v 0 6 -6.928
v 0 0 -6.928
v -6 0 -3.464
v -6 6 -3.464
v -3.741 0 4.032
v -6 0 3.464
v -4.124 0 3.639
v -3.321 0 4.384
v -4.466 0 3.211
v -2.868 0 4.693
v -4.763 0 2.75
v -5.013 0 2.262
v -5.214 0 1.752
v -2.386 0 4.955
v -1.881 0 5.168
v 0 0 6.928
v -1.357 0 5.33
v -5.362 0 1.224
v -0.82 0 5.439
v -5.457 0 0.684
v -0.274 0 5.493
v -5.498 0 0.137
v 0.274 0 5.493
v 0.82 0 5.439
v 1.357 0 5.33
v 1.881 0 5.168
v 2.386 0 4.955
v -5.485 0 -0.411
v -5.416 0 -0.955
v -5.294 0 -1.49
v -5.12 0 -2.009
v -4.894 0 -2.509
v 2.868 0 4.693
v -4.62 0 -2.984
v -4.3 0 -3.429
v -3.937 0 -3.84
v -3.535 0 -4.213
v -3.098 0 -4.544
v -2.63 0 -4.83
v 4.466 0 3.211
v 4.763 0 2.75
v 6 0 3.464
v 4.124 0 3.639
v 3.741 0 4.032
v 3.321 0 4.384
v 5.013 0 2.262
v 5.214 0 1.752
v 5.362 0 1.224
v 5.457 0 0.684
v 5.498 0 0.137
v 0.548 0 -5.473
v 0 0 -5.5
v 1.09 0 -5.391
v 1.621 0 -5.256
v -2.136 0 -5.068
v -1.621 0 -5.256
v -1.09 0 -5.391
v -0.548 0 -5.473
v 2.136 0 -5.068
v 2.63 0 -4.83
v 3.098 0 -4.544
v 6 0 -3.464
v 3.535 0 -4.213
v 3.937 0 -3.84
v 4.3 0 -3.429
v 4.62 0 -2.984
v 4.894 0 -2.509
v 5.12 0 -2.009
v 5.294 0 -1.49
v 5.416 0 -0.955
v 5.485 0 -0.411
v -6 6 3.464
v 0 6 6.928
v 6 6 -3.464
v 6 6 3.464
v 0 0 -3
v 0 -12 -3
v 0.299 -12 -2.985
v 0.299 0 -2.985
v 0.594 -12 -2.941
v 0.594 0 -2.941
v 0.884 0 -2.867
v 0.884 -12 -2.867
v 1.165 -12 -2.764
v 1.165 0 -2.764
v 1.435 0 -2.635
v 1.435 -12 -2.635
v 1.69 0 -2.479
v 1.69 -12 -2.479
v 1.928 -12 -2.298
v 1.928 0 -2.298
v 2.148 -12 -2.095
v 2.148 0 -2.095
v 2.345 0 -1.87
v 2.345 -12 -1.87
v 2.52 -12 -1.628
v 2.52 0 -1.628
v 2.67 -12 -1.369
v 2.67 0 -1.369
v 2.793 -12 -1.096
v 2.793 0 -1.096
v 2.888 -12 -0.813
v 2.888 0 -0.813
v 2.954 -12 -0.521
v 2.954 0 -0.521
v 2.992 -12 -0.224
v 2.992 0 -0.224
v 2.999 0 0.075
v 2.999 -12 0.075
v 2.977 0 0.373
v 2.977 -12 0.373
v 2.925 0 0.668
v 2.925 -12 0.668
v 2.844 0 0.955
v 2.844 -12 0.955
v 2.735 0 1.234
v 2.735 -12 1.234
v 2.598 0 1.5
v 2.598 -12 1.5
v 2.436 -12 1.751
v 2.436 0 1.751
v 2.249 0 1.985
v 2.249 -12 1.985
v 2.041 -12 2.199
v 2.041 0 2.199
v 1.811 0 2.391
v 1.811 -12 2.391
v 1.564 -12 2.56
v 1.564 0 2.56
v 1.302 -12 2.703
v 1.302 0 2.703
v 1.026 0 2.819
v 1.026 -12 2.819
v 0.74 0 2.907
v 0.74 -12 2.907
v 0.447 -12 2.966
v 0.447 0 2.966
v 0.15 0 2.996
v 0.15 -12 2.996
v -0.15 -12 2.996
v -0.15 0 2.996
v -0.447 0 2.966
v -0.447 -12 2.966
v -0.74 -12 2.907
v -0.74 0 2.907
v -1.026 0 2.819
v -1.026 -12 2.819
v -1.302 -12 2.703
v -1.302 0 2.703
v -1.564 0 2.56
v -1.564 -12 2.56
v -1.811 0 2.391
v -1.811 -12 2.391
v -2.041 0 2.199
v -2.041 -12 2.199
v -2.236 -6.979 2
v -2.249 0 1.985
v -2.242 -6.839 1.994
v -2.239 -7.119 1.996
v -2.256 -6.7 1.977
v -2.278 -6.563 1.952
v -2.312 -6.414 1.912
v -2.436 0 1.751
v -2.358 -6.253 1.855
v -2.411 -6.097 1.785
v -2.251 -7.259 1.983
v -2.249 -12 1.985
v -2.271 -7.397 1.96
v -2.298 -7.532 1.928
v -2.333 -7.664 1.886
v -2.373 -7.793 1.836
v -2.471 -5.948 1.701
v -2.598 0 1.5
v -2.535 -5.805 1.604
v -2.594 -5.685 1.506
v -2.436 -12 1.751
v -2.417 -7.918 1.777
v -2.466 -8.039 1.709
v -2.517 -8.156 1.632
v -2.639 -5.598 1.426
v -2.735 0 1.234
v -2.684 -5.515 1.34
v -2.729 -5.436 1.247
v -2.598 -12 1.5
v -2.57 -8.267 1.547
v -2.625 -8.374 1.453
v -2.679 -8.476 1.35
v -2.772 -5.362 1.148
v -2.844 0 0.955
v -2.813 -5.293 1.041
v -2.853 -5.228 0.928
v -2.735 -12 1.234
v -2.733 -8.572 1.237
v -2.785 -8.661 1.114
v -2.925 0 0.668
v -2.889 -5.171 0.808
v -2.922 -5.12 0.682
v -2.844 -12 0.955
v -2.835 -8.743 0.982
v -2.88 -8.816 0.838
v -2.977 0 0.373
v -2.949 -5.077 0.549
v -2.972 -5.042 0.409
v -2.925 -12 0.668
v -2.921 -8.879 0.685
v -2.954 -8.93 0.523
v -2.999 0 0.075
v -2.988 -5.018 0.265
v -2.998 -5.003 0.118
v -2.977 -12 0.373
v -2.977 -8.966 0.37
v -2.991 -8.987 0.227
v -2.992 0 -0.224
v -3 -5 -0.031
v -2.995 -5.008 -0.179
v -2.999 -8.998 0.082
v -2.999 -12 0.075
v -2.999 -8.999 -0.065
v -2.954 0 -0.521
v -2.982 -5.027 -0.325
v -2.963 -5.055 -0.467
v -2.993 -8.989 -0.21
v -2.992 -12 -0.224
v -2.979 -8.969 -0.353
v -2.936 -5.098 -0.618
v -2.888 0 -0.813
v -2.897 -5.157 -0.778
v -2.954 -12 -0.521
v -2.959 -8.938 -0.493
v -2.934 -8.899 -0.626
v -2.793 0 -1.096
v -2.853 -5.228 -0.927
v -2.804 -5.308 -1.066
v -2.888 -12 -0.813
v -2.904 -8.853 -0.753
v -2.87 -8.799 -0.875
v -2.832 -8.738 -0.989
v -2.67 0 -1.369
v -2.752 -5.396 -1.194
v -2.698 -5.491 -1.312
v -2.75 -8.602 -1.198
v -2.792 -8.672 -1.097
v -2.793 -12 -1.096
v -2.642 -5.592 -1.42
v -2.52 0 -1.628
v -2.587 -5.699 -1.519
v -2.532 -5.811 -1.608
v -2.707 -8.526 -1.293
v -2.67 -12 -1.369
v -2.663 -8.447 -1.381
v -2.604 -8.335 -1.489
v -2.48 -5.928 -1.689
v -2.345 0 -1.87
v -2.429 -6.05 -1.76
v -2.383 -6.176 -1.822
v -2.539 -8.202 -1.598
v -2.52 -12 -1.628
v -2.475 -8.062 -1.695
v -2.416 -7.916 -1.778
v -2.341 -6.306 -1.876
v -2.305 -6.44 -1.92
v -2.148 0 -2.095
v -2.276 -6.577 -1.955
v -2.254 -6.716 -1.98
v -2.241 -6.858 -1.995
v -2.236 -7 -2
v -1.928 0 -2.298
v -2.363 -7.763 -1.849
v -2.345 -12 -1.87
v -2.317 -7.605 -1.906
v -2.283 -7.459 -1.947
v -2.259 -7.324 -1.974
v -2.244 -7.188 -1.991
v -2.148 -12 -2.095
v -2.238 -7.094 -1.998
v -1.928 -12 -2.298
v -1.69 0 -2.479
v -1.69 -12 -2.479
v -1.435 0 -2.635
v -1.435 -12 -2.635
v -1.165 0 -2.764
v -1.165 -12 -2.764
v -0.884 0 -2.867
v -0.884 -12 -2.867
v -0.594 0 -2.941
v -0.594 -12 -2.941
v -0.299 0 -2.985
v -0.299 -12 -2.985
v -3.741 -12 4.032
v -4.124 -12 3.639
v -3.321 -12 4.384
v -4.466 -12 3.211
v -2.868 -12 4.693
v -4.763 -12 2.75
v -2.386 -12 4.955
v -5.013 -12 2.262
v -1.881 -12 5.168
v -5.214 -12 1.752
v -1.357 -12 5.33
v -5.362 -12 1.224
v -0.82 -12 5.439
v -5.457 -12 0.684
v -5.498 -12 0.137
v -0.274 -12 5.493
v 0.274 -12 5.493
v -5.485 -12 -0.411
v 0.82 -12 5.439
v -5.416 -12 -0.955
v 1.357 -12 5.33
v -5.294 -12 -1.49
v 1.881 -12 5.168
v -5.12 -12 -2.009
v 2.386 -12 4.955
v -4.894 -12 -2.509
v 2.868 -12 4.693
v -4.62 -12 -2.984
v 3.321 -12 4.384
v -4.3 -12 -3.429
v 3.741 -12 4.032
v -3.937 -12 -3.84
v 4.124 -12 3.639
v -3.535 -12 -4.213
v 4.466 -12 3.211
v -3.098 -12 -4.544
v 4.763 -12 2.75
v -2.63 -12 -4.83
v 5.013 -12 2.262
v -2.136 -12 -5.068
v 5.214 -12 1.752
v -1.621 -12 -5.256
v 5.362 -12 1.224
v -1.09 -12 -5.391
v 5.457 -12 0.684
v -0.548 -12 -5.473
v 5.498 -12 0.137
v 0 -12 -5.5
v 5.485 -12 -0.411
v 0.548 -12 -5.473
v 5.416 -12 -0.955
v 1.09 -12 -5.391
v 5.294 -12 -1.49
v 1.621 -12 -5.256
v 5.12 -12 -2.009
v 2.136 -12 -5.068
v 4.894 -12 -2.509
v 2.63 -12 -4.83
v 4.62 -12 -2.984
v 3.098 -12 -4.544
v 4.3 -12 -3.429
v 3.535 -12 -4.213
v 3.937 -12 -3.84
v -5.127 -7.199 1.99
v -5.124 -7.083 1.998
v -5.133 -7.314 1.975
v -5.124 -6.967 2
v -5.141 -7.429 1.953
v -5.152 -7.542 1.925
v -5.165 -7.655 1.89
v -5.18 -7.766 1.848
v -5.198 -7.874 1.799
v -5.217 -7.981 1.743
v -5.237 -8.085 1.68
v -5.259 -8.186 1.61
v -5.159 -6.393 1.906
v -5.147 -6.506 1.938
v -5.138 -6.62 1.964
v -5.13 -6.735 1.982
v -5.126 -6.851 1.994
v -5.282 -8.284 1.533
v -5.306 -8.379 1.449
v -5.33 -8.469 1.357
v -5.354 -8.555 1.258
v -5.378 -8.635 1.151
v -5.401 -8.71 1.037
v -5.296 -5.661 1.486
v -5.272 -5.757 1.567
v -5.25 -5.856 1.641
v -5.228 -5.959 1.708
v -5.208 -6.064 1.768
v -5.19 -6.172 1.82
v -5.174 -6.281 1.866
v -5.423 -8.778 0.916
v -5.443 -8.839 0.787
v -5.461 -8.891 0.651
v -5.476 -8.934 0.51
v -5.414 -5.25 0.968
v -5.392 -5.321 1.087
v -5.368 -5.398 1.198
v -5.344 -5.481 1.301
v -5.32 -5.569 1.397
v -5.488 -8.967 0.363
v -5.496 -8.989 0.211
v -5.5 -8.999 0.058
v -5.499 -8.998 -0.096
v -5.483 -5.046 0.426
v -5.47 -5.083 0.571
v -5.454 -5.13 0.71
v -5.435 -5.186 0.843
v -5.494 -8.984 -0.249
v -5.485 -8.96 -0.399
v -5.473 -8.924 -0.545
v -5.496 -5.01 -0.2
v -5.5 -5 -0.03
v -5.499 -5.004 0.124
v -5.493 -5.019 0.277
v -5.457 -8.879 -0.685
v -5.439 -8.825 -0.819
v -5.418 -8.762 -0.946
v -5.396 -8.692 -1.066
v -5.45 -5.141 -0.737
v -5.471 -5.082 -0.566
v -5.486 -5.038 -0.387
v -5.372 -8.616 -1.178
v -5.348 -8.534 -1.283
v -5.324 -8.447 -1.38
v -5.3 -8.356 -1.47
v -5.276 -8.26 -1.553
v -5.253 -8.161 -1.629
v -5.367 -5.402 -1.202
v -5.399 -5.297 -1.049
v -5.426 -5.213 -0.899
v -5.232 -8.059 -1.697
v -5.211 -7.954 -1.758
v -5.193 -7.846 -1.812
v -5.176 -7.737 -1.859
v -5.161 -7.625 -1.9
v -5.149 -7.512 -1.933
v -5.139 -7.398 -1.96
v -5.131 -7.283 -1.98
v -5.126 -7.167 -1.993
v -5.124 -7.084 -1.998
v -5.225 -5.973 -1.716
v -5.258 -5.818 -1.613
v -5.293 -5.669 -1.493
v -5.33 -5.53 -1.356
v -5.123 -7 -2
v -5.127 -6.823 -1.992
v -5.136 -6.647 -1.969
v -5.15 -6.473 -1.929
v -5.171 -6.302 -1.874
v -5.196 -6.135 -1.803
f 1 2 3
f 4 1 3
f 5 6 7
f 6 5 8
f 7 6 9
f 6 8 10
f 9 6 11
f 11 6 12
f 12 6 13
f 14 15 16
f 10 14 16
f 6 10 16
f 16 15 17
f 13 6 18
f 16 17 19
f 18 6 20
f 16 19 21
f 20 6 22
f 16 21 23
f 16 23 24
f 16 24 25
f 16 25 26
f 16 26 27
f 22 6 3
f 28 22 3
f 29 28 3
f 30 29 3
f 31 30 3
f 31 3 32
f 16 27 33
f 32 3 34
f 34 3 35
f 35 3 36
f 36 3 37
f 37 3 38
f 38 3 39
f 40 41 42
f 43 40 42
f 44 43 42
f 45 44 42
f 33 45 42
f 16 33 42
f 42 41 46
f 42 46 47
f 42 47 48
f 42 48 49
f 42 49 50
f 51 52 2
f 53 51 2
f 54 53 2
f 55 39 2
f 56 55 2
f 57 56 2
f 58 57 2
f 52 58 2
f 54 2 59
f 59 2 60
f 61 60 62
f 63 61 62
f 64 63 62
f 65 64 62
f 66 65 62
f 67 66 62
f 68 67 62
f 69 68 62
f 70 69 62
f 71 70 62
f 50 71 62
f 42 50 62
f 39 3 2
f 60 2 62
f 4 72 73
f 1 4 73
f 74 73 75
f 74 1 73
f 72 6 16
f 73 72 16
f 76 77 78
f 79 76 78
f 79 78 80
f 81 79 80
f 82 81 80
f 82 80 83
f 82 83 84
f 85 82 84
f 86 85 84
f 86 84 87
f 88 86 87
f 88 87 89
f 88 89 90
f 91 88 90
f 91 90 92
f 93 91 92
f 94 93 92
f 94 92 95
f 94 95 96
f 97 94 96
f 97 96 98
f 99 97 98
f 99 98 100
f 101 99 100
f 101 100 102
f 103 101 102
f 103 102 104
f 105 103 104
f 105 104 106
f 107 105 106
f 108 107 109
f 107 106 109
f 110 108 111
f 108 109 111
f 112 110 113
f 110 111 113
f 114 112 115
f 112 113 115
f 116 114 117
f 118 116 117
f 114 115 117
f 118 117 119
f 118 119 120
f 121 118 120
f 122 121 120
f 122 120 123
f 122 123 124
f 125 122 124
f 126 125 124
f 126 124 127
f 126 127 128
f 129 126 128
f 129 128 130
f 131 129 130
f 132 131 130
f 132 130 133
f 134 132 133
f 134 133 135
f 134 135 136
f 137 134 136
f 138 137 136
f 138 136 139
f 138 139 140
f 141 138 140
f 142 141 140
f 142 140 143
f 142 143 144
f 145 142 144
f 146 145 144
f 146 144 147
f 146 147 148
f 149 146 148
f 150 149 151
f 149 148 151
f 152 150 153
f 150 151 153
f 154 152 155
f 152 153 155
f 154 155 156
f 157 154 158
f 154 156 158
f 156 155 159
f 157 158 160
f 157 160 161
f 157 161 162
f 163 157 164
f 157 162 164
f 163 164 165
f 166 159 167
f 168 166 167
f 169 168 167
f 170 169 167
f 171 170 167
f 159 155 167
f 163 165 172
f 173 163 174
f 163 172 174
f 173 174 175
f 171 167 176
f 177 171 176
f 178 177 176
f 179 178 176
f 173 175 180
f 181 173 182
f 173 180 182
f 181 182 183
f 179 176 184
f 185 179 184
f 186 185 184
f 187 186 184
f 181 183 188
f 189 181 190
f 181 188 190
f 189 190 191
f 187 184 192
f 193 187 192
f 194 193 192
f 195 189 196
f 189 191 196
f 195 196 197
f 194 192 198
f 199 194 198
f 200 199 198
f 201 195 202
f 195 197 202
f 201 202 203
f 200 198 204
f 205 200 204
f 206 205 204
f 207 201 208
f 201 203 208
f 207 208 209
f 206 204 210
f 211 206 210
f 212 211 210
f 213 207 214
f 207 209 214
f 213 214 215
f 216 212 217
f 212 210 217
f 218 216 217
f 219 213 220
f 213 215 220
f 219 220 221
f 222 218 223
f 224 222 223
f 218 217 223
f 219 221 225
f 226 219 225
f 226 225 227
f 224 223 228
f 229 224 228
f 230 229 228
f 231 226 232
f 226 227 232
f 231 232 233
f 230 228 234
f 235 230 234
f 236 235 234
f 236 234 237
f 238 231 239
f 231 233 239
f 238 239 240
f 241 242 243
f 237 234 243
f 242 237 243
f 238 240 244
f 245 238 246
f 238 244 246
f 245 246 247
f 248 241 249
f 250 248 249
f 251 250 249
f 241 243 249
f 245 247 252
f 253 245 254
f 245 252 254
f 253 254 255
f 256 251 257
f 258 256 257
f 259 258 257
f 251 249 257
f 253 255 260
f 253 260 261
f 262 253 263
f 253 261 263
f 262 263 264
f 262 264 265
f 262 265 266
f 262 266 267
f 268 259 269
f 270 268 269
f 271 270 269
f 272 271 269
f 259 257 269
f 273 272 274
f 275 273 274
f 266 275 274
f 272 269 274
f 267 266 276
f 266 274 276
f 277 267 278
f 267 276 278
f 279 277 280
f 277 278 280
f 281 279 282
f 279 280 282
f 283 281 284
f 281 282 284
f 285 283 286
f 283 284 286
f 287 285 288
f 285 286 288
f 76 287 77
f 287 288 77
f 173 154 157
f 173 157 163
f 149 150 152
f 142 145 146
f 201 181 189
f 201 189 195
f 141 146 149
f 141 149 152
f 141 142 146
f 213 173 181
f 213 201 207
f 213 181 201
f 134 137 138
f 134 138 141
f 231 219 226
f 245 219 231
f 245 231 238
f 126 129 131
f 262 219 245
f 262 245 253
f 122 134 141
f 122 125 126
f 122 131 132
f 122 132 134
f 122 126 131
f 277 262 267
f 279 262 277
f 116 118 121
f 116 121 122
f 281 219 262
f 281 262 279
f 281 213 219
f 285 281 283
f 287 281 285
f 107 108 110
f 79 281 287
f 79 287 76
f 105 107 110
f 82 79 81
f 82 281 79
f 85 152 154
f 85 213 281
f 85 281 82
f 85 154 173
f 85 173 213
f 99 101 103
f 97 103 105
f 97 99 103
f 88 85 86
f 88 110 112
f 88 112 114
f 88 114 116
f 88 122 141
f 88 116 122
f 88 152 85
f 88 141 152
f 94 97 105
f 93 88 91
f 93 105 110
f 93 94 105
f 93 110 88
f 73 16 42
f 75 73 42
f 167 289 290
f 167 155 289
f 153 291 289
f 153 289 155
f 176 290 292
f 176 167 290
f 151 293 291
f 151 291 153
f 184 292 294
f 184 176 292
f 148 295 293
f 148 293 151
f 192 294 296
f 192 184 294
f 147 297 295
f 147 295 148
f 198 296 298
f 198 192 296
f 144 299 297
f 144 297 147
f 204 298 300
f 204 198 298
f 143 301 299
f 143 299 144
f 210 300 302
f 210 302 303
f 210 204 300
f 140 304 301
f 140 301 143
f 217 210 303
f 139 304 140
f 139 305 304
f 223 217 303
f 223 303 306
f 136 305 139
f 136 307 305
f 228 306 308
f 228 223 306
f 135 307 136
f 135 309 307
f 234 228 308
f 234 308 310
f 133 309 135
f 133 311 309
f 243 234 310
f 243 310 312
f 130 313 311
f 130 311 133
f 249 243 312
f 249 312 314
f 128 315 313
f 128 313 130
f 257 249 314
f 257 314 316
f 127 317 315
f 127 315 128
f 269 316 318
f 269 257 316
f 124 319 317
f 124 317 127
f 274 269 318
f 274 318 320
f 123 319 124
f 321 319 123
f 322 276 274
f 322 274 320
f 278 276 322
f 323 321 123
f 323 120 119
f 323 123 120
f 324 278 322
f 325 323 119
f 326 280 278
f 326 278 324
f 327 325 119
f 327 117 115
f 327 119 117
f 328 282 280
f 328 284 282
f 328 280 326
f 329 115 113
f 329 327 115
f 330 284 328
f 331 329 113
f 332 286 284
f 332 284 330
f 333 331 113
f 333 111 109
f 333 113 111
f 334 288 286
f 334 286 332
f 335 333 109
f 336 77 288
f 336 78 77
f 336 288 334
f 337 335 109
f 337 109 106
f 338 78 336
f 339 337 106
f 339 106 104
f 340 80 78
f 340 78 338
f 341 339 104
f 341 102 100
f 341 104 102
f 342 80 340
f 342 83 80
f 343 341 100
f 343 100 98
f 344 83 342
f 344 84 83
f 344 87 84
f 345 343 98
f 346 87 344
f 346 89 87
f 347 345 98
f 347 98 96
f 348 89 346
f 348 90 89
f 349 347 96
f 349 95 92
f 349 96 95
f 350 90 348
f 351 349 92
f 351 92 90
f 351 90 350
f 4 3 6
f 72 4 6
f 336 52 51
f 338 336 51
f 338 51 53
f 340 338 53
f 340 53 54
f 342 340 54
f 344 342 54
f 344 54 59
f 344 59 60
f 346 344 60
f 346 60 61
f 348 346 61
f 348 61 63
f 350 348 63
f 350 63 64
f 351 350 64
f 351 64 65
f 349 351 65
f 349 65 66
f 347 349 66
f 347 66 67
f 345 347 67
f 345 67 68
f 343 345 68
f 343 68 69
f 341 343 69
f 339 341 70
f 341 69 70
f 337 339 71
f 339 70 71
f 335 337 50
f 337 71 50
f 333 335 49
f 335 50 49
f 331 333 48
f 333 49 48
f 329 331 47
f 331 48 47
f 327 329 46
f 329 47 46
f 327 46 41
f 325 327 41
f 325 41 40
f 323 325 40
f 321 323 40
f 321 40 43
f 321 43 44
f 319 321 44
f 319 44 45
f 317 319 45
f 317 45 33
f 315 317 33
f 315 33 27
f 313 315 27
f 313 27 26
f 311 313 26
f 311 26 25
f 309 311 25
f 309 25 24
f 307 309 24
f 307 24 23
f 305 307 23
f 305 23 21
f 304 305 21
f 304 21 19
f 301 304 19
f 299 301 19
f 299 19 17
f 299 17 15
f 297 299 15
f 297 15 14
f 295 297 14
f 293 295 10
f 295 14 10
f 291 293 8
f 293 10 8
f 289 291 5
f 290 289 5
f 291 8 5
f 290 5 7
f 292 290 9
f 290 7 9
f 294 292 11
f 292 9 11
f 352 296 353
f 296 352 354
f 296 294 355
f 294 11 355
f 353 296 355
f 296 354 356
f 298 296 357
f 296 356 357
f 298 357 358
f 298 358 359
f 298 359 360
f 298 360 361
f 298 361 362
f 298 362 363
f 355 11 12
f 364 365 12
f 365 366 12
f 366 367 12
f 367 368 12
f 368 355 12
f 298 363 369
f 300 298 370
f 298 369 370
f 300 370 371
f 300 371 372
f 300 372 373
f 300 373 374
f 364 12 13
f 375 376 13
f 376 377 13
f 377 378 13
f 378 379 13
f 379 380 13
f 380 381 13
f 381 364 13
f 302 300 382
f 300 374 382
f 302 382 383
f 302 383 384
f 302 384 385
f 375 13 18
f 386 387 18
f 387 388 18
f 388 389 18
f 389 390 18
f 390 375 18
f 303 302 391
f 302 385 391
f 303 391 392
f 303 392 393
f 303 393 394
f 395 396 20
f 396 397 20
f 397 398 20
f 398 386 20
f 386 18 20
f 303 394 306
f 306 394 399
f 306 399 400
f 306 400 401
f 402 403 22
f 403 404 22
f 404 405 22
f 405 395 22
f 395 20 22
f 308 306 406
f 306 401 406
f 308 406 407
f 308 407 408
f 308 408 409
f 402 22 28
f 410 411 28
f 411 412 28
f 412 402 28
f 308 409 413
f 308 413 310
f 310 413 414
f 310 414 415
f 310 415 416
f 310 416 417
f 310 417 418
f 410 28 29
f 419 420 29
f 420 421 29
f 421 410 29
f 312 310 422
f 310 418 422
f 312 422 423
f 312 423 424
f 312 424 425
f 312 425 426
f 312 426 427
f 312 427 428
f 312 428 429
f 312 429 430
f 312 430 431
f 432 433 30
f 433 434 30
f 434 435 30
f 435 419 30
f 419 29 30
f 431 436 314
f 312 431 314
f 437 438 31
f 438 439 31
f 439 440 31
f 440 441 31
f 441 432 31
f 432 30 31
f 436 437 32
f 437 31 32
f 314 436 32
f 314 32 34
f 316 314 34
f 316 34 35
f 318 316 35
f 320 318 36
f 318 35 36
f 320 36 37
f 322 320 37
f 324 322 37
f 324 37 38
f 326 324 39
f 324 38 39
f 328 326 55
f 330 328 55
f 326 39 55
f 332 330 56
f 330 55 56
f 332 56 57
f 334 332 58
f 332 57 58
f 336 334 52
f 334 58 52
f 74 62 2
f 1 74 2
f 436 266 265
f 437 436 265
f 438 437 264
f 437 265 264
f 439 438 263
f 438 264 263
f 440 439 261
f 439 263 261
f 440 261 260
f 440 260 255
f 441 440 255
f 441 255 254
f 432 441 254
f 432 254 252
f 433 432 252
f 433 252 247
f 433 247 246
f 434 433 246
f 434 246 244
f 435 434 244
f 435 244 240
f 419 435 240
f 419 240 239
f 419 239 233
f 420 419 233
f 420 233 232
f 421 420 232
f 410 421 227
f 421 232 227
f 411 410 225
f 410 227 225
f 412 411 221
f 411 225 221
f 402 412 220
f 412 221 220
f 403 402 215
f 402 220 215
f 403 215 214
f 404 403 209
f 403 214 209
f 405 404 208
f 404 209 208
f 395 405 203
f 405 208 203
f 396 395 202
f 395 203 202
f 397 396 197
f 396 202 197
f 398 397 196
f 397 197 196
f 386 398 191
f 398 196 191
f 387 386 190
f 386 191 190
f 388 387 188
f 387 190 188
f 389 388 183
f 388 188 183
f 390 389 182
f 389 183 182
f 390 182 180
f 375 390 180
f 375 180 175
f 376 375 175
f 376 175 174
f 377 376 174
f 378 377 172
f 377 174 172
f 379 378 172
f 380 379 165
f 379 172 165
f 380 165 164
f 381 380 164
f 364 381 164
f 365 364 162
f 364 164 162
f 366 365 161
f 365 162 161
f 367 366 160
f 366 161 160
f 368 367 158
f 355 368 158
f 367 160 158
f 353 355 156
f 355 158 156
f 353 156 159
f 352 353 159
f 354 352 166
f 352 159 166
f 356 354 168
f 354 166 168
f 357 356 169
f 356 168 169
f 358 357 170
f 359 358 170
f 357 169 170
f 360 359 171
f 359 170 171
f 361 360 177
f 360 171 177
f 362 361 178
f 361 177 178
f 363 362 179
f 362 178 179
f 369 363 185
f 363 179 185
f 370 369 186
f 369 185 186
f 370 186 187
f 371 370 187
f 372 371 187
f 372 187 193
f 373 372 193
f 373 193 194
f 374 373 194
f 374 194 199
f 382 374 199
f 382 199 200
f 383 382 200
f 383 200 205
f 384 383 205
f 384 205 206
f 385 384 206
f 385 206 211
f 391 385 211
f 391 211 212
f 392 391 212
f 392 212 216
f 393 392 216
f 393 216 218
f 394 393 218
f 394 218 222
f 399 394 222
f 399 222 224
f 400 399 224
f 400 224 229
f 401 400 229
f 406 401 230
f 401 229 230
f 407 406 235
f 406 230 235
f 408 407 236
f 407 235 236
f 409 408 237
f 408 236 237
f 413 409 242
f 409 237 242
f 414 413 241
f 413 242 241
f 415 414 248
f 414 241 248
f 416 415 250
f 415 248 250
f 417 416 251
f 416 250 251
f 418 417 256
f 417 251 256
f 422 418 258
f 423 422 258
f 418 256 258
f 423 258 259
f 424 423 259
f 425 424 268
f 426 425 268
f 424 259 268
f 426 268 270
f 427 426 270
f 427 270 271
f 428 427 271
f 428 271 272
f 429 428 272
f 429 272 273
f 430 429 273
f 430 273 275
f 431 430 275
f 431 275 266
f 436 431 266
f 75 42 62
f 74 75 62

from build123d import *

# Parameters (mm, degrees)
EXTRUDE_1_DEPTH     = 6
SKETCH_2_R          = 5.5
EXTRUDE_2_DEPTH     = 12
SKETCH_3_R          = 2
CUT_EXTRUDE_1_DEPTH = 12
SKETCH_4_R          = 3
CUT_EXTRUDE_2_DEPTH = 12


with BuildPart() as part:
    # 草图1 → 凸台-拉伸1 (new body)
    with BuildSketch(Plane(origin=(0, 0, 0), x_dir=(1, 0, 0), z_dir=(0, 1, 0))):
        Polygon((0, 6.92820323), (-6, 3.464101615), (-6, -3.464101615), (0, -6.92820323), (6, -3.464101615), (6, 3.464101615), align=None)
    extrude(amount=EXTRUDE_1_DEPTH)

    # 草图2 → 凸台-拉伸2 (add)
    with BuildSketch(Plane.XZ):
        with Locations(Location((0, 0, 0), (0, 0, 270))):
            Circle(SKETCH_2_R)
    extrude(amount=EXTRUDE_2_DEPTH)

    # 草图3 → 切除-拉伸1 (cut)
    with BuildSketch(Plane(origin=(0, 0, 0), x_dir=(0, 0, -1), z_dir=(1, 0, 0))):
        with Locations((0, -7)):
            Circle(SKETCH_3_R)
    extrude(amount=-CUT_EXTRUDE_1_DEPTH, mode=Mode.SUBTRACT)

    # 草图4 → 切除-拉伸2 (cut)
    with BuildSketch(Plane.XZ.offset(12)):
        with Locations(Location((0, 0, 0), (0, 0, 270))):
            Circle(SKETCH_4_R)
    extrude(amount=-CUT_EXTRUDE_2_DEPTH, mode=Mode.SUBTRACT)


solid = part.part
